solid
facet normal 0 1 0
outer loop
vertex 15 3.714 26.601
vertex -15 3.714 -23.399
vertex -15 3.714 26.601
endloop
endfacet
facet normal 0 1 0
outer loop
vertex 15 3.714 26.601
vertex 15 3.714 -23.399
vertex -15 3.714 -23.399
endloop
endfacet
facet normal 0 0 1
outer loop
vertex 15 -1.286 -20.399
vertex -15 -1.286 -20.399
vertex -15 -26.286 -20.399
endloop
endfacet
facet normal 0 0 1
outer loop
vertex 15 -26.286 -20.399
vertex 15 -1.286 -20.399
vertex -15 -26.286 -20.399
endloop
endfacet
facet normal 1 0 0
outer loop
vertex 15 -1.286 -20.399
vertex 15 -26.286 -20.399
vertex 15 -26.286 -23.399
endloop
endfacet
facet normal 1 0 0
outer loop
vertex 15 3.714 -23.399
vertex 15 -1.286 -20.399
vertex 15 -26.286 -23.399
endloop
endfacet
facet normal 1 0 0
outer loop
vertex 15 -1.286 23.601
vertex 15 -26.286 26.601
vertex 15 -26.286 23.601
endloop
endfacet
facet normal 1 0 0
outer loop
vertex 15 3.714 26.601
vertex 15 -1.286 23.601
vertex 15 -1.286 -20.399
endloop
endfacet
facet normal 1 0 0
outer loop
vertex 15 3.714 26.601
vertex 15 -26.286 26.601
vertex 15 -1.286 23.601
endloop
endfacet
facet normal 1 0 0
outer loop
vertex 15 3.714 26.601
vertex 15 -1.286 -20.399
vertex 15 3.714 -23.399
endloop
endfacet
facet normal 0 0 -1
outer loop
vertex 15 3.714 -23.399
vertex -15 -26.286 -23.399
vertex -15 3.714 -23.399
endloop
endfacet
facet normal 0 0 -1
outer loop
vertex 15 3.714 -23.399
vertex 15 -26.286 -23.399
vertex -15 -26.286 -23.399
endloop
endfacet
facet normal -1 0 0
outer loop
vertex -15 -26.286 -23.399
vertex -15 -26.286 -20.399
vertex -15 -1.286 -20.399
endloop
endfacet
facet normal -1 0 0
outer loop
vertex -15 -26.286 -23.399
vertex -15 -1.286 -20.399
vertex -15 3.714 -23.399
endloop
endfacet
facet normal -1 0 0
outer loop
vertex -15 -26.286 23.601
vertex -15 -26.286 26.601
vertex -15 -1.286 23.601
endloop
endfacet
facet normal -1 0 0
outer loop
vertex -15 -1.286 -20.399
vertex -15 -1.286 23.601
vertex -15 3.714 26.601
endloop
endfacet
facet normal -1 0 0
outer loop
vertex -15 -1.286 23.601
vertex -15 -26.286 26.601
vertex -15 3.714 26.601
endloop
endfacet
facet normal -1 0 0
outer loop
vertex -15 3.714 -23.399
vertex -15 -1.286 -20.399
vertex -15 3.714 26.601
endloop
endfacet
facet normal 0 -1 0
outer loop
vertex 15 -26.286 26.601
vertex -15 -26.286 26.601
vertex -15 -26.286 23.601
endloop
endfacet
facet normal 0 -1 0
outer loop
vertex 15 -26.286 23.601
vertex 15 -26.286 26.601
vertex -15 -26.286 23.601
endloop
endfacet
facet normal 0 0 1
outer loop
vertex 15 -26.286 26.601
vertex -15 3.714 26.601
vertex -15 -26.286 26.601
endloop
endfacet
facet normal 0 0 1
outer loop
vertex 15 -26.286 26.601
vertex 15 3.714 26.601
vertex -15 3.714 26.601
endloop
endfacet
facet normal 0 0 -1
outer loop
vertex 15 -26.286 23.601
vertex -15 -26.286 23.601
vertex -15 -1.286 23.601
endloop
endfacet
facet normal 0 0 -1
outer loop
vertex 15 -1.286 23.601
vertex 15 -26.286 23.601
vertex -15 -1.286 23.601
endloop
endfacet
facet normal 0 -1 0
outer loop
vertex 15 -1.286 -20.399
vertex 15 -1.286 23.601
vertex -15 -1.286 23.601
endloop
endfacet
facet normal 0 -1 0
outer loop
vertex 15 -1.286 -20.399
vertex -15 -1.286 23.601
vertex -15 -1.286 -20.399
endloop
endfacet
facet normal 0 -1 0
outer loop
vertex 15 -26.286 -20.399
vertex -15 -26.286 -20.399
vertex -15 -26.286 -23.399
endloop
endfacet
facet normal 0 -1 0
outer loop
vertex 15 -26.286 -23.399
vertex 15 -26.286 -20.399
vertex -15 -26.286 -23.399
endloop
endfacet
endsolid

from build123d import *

# Parameters (mm, degrees)
F1_DEPTH = 15


with BuildPart() as f1:
    # F0 (on Right) → F1 (new body, symmetric)
    with BuildSketch(Plane.YZ):
        Polygon((0, -1.8719722131), (-30, -1.8719722131), (-30, -4.8719722131), (-5, -4.8719722131), (-5, -48.8719722131), (-30, -48.8719722131), (-30, -51.8719722131), (0, -51.8719722131), align=None)
    extrude(amount=F1_DEPTH, both=True)


with BuildPart() as f1_1:
    # F2: moved
    add(f1.part.moved(Location((0, 3.7136785686, 28.4729581326))))


solid = f1_1.part
